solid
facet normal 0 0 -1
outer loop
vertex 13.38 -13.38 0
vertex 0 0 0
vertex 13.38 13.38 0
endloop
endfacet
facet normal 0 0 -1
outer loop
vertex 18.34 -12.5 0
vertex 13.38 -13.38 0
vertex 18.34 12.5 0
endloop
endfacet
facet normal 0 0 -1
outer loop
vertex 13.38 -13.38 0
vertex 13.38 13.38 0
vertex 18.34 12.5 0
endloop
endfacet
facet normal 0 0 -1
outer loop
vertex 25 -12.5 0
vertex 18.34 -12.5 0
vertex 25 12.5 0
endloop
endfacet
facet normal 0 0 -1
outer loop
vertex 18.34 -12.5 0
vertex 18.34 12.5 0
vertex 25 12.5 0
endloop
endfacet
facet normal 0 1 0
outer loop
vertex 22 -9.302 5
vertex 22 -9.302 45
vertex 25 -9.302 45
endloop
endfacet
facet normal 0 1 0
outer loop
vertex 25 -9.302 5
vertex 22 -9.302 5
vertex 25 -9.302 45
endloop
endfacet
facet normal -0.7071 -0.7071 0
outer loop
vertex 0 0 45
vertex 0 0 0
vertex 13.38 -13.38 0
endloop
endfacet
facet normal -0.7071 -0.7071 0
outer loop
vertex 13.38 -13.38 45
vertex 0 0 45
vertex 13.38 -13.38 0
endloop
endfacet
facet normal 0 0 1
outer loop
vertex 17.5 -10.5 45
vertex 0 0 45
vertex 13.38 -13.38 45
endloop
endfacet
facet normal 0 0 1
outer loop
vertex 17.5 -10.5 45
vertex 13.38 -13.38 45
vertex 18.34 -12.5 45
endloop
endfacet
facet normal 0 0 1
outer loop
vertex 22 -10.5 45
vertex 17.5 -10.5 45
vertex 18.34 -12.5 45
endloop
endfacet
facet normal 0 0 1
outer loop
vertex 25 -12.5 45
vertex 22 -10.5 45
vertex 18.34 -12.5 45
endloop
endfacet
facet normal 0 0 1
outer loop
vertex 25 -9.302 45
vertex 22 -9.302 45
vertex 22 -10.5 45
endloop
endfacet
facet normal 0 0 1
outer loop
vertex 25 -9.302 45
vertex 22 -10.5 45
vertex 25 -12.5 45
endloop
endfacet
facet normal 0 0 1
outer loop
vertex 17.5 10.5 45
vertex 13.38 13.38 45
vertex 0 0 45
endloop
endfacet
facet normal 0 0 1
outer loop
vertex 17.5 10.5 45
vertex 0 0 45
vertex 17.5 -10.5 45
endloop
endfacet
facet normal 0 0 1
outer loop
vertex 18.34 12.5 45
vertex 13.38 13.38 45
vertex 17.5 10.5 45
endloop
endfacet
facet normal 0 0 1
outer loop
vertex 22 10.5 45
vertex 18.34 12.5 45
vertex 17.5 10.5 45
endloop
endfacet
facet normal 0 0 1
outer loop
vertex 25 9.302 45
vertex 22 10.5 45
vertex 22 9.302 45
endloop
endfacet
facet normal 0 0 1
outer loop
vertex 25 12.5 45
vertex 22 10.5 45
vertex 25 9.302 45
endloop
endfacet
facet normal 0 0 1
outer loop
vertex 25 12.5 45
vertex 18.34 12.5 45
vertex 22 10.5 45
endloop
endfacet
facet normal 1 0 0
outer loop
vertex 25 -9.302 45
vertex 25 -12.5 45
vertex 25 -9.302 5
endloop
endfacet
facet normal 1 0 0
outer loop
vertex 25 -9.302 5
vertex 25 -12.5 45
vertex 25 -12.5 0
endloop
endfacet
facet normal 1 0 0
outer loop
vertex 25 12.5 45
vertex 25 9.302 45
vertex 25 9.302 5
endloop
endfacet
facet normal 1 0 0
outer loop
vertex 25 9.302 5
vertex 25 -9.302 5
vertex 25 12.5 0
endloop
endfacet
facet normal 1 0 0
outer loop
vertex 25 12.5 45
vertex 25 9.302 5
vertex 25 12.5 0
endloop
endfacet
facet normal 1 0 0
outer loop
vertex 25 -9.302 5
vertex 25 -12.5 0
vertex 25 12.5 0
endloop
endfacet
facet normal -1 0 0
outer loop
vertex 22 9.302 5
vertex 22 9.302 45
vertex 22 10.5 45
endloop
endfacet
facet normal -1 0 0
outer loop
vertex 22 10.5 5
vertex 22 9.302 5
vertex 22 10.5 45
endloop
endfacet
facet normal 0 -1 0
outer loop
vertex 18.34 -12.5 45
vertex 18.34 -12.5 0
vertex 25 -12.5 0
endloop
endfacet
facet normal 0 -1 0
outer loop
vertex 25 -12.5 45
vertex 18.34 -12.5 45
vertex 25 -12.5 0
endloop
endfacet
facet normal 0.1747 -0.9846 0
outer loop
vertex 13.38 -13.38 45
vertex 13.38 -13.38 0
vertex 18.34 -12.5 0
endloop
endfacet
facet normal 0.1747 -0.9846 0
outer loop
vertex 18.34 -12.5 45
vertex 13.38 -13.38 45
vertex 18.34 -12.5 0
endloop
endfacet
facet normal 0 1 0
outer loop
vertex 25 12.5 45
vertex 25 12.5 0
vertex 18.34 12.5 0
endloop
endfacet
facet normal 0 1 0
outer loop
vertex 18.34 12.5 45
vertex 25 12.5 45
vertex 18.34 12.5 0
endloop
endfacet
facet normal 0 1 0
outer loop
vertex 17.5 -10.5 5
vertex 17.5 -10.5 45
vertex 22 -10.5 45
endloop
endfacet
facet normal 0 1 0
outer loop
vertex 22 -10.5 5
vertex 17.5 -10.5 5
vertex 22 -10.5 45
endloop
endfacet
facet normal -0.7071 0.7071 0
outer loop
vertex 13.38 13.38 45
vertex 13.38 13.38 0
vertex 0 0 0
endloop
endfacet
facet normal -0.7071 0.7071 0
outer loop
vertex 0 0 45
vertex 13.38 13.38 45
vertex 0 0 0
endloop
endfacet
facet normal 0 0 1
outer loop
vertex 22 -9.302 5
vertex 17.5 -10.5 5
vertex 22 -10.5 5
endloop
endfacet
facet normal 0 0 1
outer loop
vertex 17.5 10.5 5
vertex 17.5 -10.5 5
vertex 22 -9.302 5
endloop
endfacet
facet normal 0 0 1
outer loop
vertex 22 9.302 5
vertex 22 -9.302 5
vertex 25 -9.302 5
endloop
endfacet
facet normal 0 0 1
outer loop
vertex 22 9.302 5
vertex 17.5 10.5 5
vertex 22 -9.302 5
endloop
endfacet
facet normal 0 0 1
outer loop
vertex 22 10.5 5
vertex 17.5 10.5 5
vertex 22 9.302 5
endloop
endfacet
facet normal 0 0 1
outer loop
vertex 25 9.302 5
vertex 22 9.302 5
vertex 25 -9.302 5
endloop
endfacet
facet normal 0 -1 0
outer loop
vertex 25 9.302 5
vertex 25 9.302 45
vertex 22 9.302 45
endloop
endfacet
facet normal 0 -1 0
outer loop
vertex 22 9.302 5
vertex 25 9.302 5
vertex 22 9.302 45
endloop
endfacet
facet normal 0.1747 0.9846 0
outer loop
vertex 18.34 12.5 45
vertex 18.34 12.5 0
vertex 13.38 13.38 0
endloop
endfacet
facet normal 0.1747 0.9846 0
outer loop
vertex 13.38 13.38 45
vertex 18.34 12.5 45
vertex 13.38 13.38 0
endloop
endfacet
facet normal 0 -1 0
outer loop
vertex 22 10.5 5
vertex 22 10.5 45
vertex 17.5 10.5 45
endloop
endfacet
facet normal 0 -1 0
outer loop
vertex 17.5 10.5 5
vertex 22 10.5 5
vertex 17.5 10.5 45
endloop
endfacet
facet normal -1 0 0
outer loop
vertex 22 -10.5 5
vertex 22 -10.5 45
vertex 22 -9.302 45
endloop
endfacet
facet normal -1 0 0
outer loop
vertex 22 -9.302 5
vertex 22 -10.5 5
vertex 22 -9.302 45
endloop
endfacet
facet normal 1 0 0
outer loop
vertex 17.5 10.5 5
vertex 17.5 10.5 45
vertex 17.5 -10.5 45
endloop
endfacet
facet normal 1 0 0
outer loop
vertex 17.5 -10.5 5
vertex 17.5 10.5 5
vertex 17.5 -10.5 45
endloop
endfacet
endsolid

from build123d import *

# Parameters (mm, degrees)
PAD_DEPTH    = 45
POCKET_DEPTH = 40


with BuildPart() as part:
    # Sketch → Pad (new body)
    with BuildSketch(Plane.XY):
        Polygon((13.380021, 13.380021), (0, 0), (13.380021, -13.380021), (18.339621, -12.5), (25, -12.5), (25, 12.5), (18.339621, 12.5), align=None)
    extrude(amount=PAD_DEPTH)

    # Sketch001 (on Face9 of Pad) → Pocket (cut)
    with BuildSketch(Plane.XY.offset(45)):
        Polygon((25, 9.302202), (22, 9.302202), (22, 10.5), (17.5, 10.5), (17.5, -10.5), (22, -10.5), (22, -9.302202), (25, -9.302202), align=None)
    extrude(amount=-POCKET_DEPTH, mode=Mode.SUBTRACT)


solid = part.part
